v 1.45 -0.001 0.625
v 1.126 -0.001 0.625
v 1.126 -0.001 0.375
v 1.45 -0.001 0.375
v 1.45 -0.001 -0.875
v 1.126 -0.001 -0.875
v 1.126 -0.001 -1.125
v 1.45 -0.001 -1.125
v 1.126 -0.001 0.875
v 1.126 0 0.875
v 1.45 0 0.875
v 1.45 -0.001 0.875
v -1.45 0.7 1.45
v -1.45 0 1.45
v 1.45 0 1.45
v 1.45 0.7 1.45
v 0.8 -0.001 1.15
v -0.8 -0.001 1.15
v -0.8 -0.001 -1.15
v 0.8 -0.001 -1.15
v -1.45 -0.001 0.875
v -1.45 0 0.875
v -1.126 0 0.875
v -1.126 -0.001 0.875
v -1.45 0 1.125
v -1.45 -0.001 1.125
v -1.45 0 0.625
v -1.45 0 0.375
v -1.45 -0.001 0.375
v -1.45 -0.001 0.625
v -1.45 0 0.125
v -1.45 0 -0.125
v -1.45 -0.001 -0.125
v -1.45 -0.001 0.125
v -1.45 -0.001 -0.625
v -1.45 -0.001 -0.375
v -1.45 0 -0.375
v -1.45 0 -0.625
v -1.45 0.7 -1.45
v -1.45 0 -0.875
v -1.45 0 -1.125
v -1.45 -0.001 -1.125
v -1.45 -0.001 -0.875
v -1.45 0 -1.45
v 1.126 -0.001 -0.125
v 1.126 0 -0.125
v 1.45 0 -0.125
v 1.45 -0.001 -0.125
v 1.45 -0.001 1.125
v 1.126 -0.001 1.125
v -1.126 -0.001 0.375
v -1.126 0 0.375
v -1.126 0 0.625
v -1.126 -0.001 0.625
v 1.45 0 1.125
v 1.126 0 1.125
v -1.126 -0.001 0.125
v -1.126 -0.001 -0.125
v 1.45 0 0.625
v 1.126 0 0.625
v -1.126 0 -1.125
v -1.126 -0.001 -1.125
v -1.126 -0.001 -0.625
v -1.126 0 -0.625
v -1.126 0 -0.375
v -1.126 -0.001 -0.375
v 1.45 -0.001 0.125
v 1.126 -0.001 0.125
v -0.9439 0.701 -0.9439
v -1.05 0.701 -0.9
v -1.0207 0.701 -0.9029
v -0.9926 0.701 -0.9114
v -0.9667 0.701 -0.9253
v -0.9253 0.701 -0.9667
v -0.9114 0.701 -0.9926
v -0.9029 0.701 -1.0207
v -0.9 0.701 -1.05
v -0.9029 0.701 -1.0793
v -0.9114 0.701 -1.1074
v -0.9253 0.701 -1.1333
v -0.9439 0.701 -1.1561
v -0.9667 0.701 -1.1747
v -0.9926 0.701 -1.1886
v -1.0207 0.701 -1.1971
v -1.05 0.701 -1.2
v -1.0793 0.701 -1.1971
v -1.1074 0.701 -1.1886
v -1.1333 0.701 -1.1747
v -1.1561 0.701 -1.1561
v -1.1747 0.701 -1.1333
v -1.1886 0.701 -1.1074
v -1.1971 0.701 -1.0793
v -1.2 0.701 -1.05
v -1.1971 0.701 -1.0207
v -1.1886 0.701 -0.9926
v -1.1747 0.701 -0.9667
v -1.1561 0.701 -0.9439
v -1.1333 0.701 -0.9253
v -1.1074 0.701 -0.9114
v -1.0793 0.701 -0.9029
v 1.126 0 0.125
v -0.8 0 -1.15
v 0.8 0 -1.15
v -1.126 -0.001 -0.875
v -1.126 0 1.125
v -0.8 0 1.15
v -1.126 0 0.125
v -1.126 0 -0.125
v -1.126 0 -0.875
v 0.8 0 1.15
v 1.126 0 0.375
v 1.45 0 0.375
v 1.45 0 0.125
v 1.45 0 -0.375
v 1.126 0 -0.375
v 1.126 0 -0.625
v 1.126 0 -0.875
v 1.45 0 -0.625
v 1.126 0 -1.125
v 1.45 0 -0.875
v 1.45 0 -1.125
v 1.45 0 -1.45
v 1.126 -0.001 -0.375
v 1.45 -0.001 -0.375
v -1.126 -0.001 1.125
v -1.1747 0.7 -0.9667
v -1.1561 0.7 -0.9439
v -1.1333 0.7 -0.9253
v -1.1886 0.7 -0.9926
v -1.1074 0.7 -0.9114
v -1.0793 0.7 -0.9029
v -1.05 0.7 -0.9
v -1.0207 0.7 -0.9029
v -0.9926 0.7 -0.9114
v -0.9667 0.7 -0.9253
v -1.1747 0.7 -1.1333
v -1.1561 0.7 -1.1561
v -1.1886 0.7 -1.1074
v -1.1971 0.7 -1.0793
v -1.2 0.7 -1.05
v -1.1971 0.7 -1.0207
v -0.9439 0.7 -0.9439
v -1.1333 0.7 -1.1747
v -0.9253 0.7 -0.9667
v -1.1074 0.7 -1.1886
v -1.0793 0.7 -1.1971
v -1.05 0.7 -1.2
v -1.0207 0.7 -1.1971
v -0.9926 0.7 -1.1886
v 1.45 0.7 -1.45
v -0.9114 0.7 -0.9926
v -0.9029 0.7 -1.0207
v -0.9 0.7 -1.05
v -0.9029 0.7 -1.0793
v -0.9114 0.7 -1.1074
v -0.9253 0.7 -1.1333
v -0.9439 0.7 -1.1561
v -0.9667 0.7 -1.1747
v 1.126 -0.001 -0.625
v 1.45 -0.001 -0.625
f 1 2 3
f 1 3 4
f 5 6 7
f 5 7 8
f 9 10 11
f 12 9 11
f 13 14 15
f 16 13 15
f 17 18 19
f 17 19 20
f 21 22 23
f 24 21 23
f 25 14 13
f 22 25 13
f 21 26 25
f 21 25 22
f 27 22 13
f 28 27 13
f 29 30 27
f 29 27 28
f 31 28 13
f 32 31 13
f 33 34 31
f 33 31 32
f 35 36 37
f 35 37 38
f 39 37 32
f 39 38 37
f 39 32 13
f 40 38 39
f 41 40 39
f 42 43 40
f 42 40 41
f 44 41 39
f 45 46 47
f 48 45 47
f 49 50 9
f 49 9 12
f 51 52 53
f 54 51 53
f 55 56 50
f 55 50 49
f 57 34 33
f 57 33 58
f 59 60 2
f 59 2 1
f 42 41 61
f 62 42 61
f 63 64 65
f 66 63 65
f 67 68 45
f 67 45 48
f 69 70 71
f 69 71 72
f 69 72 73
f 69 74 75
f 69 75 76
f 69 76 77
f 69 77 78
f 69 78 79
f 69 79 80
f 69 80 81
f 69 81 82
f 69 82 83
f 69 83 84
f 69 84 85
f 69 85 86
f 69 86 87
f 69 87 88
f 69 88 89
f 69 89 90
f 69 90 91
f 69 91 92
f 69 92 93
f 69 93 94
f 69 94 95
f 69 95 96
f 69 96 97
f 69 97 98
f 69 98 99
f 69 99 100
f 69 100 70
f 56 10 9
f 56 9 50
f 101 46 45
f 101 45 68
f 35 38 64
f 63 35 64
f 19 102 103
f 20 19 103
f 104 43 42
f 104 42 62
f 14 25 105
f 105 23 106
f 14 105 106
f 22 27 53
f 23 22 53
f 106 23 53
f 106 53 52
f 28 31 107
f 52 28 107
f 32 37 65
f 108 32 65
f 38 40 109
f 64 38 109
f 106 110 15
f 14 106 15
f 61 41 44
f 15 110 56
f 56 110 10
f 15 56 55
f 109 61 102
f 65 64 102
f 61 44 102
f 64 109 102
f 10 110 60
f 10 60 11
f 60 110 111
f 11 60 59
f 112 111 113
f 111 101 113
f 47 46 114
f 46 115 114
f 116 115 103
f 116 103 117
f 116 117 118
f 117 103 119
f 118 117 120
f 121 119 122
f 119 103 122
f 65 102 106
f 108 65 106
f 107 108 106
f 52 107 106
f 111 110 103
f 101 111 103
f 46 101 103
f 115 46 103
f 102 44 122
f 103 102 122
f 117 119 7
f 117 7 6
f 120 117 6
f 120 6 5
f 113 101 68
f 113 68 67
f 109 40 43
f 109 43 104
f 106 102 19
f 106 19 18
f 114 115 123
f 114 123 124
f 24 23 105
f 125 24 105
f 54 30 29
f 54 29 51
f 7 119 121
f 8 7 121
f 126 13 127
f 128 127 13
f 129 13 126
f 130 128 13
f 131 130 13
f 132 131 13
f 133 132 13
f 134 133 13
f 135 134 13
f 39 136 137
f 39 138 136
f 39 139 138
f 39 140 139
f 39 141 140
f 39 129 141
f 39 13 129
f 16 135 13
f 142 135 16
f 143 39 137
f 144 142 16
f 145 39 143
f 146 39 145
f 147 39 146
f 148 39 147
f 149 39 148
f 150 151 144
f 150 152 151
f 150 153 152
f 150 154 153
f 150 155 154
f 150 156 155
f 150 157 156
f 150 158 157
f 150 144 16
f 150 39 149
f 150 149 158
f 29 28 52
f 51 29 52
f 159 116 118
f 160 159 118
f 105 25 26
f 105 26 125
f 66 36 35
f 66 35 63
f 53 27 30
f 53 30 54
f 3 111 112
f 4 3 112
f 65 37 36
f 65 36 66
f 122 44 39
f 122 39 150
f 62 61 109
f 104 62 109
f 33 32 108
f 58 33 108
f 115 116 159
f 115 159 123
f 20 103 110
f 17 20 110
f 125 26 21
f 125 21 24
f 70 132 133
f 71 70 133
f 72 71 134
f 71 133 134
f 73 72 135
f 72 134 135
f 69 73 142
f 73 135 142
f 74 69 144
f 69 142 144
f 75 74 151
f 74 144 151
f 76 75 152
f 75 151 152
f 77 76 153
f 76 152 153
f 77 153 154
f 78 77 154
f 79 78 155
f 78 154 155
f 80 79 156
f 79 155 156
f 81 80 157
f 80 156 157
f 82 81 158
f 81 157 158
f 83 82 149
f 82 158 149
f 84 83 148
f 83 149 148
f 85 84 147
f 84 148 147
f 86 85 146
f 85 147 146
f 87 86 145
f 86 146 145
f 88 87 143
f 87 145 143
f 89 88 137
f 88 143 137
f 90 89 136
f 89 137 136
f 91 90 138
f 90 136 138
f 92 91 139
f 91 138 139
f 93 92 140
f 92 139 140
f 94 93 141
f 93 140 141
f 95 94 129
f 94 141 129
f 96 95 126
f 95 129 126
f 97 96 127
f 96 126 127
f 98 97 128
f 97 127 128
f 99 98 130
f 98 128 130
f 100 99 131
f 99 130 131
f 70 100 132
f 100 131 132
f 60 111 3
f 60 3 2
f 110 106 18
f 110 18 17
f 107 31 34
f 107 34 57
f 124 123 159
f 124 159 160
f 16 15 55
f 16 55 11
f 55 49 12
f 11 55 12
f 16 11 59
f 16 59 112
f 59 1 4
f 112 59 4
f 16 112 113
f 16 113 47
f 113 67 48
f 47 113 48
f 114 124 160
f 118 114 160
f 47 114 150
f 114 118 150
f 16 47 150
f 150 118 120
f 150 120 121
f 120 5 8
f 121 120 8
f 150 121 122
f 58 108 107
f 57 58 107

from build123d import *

# Parameters (mm, degrees)
SKETCH1_W           = 2.9
SKETCH1_H           = 2.9
BOSS_EXTRUDE1_DEPTH = 0.7
SKETCH2_W           = 0.324
SKETCH2_H           = 0.25
SKETCH2_W_2         = 1.6
SKETCH2_H_2         = 2.3
BOSS_EXTRUDE2_DEPTH = 0.001
SKETCH3_R           = 0.15
BOSS_EXTRUDE3_DEPTH = 0.001


with BuildPart() as part:
    # Sketch1 → Boss-Extrude1 (new body)
    with BuildSketch(Plane(origin=(0, 0, 0), x_dir=(1, 0, 0), z_dir=(0, 1, 0))):
        Rectangle(SKETCH1_W, SKETCH1_H)
    extrude(amount=BOSS_EXTRUDE1_DEPTH)

    # Sketch2 → Boss-Extrude2 (add)
    with BuildSketch(Plane.XZ):
        with Locations((-1.288, 0)):
            Rectangle(SKETCH2_W, SKETCH2_H)
        with Locations((-1.288, 0.5)):
            Rectangle(SKETCH2_W, SKETCH2_H)
        with Locations((-1.288, 1)):
            Rectangle(SKETCH2_W, SKETCH2_H)
        with Locations((-1.288, -1)):
            Rectangle(SKETCH2_W, SKETCH2_H)
        with Locations((-1.288, -0.5)):
            Rectangle(SKETCH2_W, SKETCH2_H)
        with Locations((1.288, -1)):
            Rectangle(SKETCH2_W, SKETCH2_H)
        with Locations((1.288, -0.5)):
            Rectangle(SKETCH2_W, SKETCH2_H)
        with Locations((1.288, 0)):
            Rectangle(SKETCH2_W, SKETCH2_H)
        with Locations((1.288, 0.5)):
            Rectangle(SKETCH2_W, SKETCH2_H)
        with Locations((1.288, 1)):
            Rectangle(SKETCH2_W, SKETCH2_H)
        Rectangle(SKETCH2_W_2, SKETCH2_H_2)
    extrude(amount=BOSS_EXTRUDE2_DEPTH)

    # Sketch3 → Boss-Extrude3 (add)
    with BuildSketch(Plane(origin=(0, 0.7, 0), x_dir=(1, 0, 0), z_dir=(0, 1, 0))):
        with Locations(Location((-1.05, 1.05, 0), (0, 0, 270))):
            Circle(SKETCH3_R)
    extrude(amount=BOSS_EXTRUDE3_DEPTH)


solid = part.part
